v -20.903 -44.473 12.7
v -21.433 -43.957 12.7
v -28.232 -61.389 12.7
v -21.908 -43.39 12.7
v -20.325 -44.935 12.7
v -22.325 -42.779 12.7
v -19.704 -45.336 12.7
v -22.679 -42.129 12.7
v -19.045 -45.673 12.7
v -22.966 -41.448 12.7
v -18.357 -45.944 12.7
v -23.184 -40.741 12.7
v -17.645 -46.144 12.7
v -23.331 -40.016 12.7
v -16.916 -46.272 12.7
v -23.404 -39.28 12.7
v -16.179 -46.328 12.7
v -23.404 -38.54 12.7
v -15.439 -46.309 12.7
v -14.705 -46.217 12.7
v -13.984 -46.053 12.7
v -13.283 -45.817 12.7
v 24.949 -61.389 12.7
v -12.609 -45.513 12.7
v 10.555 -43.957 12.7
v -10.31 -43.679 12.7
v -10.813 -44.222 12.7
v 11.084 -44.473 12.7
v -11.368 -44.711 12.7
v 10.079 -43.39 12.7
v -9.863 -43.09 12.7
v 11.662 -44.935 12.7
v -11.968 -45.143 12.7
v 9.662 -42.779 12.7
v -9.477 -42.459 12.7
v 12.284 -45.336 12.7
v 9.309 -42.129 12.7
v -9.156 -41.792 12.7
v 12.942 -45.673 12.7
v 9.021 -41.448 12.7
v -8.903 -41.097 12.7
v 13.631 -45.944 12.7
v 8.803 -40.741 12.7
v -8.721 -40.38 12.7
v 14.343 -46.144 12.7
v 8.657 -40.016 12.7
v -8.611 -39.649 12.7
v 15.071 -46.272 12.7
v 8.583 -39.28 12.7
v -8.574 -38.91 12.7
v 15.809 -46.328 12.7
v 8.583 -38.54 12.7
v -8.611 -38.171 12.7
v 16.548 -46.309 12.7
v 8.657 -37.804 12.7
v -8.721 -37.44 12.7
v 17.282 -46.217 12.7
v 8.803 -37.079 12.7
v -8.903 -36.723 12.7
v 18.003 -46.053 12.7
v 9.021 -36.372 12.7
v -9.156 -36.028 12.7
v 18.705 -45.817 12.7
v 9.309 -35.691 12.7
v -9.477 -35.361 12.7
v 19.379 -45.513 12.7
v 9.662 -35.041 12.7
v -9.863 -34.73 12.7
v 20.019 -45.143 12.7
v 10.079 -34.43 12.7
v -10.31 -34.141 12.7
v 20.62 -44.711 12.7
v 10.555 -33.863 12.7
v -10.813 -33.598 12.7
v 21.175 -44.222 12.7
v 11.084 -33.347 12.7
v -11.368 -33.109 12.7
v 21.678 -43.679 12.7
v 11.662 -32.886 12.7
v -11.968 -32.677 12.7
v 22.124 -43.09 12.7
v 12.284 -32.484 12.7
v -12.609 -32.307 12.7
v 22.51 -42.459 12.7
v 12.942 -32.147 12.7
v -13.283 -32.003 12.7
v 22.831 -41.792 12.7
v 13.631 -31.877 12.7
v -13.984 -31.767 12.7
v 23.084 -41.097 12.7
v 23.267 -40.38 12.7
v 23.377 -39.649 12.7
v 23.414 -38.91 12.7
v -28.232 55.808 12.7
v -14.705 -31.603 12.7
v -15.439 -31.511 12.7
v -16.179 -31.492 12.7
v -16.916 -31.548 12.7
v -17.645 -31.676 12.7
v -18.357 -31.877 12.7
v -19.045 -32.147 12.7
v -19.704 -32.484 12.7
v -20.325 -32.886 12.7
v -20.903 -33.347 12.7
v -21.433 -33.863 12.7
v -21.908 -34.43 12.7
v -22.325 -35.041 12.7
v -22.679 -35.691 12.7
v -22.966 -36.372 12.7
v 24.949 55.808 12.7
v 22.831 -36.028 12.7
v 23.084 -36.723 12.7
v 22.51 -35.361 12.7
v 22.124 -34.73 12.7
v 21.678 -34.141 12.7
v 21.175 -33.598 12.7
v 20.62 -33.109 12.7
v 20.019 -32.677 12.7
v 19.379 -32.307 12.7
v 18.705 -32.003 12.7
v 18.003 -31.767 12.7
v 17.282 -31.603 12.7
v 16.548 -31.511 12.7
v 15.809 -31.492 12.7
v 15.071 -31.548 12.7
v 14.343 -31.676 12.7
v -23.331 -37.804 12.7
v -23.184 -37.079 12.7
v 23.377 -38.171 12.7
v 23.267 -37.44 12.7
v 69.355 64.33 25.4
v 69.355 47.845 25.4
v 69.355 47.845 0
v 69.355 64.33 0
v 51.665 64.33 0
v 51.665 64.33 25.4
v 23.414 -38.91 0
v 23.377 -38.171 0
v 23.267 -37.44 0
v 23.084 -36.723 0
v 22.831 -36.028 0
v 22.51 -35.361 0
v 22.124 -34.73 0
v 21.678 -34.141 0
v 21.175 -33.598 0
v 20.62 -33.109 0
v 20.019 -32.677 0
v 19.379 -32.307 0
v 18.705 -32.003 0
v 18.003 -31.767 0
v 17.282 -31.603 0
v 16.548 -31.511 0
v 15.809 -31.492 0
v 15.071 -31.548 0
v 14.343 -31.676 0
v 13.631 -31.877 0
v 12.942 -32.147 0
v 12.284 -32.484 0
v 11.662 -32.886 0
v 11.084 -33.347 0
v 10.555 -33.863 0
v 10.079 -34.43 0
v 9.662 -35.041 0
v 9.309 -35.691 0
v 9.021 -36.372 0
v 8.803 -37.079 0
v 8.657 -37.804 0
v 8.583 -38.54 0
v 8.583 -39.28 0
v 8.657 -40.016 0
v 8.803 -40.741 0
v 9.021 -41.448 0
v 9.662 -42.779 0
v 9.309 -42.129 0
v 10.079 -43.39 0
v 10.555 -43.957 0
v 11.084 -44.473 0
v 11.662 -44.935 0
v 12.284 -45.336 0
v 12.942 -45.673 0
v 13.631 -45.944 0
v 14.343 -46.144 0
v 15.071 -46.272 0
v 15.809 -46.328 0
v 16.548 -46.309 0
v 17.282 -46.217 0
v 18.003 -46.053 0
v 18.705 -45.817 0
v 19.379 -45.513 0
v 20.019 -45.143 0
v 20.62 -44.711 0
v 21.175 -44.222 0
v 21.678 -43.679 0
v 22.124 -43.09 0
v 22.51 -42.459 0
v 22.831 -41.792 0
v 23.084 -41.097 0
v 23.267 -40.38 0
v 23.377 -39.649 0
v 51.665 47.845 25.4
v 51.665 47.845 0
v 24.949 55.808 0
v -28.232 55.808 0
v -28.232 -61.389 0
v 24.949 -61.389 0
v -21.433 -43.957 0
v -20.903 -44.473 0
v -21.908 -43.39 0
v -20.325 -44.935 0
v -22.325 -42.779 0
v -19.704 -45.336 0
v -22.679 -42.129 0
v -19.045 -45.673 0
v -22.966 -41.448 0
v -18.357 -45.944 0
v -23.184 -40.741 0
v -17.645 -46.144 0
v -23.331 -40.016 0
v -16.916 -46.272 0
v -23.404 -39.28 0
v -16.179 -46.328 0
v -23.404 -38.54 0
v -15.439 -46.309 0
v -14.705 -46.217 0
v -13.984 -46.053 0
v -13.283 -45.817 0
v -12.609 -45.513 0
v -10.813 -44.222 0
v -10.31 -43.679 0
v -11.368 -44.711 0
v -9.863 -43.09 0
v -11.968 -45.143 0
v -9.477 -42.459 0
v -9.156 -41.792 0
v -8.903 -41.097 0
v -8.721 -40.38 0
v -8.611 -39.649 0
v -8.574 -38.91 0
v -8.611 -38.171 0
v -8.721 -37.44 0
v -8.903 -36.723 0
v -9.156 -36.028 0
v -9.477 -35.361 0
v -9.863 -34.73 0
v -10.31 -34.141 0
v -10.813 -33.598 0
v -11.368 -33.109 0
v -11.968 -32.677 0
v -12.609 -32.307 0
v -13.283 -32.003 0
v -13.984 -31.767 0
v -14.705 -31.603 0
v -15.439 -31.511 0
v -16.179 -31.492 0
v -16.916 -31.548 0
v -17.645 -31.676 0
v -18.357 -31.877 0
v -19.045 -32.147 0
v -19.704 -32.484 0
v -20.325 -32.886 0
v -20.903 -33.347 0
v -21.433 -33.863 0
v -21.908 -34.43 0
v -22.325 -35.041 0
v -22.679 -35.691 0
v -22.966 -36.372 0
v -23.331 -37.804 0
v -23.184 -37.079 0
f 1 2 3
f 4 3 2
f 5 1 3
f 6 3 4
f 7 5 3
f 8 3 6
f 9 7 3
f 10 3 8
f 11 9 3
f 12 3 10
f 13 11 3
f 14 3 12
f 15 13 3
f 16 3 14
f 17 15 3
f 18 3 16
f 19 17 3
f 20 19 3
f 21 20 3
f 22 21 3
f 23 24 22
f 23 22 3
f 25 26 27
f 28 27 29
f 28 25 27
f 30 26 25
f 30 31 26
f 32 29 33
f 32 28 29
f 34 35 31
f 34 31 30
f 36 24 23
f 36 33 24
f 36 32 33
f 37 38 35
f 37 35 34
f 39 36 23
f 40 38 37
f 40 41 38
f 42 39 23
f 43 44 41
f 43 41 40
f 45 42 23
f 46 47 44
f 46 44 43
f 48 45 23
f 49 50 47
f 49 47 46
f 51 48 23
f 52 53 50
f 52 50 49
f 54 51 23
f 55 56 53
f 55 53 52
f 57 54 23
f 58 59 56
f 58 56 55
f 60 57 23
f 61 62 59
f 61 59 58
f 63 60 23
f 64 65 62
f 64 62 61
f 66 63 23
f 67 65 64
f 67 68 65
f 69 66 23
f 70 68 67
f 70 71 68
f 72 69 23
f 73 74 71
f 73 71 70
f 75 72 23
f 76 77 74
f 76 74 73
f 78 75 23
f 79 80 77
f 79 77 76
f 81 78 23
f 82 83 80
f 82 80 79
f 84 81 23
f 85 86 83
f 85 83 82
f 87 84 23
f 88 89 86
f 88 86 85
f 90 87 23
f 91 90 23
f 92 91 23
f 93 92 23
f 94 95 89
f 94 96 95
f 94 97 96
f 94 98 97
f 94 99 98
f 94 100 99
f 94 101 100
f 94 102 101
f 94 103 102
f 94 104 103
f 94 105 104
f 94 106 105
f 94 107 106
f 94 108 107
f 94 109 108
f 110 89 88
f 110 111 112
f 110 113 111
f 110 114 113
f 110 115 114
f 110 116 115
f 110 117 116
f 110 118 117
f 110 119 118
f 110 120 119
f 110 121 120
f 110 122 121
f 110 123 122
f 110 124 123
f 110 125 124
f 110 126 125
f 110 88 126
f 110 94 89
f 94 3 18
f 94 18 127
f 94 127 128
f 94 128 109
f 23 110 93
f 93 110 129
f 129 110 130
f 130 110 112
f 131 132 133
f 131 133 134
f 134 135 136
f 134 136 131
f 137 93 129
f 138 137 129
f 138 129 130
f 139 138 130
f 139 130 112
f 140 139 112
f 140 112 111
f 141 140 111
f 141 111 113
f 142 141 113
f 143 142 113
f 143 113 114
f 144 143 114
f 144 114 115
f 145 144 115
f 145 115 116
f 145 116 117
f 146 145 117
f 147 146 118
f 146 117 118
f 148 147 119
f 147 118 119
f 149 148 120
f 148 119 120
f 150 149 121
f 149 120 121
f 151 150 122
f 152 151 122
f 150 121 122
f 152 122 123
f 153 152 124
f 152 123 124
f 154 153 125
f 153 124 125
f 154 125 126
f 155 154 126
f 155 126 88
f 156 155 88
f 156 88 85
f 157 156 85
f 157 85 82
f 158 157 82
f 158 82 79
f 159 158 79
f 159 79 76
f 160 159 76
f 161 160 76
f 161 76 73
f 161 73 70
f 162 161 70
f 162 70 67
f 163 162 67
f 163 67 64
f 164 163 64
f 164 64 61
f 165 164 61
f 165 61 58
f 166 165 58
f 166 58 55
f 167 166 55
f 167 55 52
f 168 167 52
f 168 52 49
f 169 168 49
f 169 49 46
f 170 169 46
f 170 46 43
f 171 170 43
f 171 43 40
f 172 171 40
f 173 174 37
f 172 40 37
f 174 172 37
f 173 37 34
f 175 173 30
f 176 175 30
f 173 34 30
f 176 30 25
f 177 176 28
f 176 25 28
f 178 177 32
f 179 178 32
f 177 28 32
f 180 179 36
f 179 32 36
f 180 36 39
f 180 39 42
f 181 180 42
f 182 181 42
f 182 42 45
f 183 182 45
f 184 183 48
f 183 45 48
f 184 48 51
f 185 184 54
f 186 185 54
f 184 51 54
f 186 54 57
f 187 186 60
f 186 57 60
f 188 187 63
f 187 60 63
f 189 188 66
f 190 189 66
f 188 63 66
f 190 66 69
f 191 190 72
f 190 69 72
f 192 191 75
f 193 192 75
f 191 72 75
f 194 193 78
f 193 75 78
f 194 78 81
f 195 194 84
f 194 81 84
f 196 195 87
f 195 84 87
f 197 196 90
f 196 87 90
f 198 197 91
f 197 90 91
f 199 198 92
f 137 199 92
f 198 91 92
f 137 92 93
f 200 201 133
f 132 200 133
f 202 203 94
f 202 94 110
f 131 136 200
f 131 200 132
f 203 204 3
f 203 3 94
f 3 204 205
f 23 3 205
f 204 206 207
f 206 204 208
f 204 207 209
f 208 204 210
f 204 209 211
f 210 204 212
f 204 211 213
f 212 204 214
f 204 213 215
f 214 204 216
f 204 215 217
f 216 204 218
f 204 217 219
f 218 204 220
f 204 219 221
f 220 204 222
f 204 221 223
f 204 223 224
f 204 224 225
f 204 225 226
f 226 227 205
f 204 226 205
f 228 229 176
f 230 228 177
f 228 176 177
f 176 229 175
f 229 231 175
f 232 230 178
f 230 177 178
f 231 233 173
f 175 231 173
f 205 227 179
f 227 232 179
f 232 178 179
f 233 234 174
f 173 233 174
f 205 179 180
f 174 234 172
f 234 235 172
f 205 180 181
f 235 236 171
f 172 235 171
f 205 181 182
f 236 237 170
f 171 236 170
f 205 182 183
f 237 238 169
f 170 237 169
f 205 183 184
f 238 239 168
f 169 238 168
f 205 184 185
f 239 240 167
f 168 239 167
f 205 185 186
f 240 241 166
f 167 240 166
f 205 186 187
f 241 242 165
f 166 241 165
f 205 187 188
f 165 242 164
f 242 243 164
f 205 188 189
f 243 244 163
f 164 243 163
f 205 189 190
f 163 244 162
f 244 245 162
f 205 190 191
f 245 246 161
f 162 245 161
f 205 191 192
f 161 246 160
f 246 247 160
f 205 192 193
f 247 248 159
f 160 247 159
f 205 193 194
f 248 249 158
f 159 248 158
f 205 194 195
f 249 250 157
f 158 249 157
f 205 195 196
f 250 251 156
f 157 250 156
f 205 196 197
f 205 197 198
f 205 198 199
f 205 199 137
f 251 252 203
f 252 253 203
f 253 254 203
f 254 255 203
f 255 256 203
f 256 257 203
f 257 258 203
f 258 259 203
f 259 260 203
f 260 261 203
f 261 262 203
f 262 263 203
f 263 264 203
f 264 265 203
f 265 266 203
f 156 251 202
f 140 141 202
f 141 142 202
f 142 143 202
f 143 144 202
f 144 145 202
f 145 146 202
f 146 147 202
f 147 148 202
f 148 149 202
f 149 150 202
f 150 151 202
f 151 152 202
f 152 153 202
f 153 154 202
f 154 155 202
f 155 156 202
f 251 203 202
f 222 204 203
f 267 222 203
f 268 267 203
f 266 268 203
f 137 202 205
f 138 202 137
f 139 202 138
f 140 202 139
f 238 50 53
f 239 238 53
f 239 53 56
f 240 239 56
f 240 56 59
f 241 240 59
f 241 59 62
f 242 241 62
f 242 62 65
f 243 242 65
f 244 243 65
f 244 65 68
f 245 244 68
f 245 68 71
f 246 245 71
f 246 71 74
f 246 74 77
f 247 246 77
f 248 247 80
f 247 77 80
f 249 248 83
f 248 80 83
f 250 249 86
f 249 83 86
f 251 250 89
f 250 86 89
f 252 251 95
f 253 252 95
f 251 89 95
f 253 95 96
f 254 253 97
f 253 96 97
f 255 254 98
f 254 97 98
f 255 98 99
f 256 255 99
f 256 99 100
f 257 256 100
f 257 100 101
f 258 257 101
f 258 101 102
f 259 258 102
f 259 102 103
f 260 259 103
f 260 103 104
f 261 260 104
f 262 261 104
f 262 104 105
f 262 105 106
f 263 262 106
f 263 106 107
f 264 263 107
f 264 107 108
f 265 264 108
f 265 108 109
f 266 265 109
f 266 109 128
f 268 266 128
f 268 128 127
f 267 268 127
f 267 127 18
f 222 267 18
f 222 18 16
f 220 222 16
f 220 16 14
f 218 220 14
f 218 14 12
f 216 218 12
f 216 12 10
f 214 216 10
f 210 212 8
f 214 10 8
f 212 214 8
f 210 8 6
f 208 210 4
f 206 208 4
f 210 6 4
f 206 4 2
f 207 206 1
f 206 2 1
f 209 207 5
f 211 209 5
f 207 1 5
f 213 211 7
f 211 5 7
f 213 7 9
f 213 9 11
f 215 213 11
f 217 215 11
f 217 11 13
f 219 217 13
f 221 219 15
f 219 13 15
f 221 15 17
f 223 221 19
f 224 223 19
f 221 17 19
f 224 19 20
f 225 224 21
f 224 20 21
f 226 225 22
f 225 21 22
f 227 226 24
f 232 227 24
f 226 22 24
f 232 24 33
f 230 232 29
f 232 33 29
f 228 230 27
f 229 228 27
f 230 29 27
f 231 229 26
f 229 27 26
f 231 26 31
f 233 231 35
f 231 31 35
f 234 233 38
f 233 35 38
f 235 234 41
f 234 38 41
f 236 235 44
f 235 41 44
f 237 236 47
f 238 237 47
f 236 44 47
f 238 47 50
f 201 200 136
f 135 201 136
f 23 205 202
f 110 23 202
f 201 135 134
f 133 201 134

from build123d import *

# Parameters (mm, degrees)
F0_W     = 53.1815
F0_H     = 117.196273
F1_DEPTH = 12.7
F0_W_2   = 17.690659
F0_H_2   = 16.48447
F2_DEPTH = 25.4
F3_R     = 7.419918
F4_DEPTH = 37.084


with BuildPart() as f1:
    # F0 (on Top) → F1 (new body)
    with BuildSketch(Plane.XY):
        with Locations((-1.641404, -2.790385)):
            Rectangle(F0_W, F0_H)
    extrude(amount=F1_DEPTH)

    # F3 (on face) → F4 (cut)
    with BuildSketch(Plane.XY.offset(12.7)):
        with Locations((-15.993746, -38.910057)):
            Circle(F3_R)
        with Locations((15.993746, -38.910057)):
            Circle(F3_R)
    extrude(amount=-F4_DEPTH, mode=Mode.SUBTRACT)


with BuildPart() as f2:
    # F0 (on Top) → F2 (new body)
    with BuildSketch(Plane.XY):
        with Locations((60.510076, 56.087412)):
            Rectangle(F0_W_2, F0_H_2)
    extrude(amount=F2_DEPTH)


solid = Compound([f1.part, f2.part])
